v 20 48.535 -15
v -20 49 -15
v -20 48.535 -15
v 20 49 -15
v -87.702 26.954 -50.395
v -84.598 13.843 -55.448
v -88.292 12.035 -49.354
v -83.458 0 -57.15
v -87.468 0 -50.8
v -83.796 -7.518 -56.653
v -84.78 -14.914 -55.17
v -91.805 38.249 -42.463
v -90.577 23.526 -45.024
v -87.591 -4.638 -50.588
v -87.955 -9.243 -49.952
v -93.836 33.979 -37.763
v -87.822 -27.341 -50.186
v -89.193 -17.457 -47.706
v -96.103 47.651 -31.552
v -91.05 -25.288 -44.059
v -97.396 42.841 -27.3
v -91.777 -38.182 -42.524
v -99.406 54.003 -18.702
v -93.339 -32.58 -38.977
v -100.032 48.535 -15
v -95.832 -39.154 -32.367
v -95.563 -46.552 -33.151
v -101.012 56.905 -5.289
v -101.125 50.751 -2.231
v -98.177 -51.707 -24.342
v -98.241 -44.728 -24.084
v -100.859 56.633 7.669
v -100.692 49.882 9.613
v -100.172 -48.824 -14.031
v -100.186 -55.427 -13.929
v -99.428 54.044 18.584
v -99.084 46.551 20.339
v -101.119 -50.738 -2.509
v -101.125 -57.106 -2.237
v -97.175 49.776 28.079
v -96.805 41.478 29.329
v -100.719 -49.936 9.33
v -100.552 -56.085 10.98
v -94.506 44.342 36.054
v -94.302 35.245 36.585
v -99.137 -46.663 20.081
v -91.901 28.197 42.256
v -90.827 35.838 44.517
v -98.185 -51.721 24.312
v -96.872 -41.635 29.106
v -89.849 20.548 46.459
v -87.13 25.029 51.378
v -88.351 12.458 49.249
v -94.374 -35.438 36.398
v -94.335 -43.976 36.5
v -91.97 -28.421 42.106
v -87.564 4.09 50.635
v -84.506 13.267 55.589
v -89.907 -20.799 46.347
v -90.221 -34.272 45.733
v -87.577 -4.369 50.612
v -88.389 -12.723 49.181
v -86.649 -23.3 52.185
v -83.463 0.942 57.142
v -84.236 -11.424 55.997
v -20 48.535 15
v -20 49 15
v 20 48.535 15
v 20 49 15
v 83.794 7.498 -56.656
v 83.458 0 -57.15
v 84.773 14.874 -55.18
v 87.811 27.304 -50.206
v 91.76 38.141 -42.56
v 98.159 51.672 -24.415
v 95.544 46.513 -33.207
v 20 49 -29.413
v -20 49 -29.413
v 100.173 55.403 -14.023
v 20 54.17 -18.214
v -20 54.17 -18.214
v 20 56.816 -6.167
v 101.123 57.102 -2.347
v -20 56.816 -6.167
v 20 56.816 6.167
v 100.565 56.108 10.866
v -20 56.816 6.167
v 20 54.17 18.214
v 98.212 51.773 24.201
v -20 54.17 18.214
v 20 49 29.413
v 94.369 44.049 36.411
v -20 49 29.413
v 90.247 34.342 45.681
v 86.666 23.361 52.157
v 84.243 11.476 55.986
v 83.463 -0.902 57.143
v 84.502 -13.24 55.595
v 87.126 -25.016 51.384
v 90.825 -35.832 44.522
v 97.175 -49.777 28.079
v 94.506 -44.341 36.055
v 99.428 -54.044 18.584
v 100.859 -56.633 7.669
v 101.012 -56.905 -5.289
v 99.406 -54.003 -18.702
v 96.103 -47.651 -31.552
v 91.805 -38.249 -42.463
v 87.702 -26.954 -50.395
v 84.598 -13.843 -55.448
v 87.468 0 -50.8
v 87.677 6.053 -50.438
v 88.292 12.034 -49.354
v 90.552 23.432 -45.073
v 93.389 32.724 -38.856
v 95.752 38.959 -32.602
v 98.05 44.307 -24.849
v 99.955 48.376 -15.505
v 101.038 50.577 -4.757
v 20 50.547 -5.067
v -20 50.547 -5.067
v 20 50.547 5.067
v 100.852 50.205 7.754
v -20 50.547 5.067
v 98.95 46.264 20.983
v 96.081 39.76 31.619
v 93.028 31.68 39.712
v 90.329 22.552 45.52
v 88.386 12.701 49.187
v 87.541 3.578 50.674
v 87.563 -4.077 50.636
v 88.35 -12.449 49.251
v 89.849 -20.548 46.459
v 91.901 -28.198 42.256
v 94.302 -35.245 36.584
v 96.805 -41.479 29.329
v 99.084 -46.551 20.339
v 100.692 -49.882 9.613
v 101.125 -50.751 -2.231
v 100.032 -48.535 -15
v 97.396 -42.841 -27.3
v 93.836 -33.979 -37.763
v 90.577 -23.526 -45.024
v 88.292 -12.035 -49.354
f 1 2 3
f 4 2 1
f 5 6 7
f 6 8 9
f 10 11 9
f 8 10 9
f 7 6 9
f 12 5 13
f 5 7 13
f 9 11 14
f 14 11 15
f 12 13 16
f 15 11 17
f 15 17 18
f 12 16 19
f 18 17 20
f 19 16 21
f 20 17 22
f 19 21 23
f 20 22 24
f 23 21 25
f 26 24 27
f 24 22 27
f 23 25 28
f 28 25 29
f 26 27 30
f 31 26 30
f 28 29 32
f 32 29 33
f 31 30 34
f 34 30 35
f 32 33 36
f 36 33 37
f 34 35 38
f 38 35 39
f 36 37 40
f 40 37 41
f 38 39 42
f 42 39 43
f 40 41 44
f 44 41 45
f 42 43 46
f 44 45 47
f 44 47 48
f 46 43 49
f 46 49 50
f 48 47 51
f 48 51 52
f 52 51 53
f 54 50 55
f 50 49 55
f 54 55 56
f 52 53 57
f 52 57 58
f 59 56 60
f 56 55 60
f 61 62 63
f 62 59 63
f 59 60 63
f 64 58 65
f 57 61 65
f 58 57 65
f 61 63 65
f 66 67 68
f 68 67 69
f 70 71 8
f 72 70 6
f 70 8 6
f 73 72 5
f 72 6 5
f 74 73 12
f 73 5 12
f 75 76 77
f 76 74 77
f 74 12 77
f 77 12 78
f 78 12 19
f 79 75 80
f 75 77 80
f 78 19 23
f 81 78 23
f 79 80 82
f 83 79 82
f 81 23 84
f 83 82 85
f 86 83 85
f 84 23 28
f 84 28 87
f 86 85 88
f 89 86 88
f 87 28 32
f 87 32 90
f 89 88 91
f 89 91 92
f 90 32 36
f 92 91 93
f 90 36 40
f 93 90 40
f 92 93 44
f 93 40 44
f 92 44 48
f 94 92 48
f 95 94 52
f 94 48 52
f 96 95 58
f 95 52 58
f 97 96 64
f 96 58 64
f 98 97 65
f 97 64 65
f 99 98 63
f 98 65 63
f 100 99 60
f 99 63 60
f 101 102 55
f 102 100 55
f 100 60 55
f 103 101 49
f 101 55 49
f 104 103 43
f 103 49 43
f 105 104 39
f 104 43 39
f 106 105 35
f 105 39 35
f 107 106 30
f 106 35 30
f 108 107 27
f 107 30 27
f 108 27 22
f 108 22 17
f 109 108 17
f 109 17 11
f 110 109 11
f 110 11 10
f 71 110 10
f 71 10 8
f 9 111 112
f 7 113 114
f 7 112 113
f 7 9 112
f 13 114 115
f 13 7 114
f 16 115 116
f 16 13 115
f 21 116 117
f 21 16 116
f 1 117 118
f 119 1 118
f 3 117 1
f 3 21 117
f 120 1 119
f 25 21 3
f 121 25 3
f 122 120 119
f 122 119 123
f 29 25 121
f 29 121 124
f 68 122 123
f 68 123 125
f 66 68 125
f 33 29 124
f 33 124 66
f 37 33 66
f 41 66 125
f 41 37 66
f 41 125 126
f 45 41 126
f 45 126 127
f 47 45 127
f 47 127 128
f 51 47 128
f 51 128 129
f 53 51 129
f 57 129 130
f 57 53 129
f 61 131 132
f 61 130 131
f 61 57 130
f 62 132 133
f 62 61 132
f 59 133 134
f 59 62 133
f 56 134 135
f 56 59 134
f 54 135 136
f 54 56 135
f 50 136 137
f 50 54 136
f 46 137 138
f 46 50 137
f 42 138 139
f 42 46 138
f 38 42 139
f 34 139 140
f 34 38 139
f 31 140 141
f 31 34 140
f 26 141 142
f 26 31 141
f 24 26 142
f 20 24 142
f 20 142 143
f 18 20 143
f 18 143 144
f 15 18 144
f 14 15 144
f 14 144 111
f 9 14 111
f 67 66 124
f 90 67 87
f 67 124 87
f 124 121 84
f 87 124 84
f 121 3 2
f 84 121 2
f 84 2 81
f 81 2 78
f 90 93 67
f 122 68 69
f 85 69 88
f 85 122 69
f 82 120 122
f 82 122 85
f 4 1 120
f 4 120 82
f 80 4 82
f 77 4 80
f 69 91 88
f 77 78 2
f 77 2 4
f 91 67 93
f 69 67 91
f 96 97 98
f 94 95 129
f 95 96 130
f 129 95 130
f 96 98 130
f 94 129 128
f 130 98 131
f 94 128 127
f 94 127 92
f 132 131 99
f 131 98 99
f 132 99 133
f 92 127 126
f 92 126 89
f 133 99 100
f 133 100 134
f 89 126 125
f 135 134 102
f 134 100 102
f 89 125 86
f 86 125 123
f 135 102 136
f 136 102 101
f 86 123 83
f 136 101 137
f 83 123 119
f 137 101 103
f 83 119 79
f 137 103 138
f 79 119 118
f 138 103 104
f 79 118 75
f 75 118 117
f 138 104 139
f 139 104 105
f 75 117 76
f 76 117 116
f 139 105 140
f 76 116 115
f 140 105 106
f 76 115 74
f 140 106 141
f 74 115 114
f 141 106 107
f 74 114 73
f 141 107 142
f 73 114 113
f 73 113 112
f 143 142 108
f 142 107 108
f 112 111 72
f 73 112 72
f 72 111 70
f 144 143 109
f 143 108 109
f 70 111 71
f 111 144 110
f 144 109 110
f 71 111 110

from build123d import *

# Parameters (mm, degrees)
BOSS_EXTRUDE1_DEPTH      = 101.15
BOSS_EXTRUDE1_DEPTH_BACK = 101.15
SKETCH1_R                = 57.15
SKETCH1_R_2              = 50.8
CUT_EXTRUDE3_DEPTH       = 130.474196271
CUT_EXTRUDE3_DEPTH_BACK  = 130.474196271
SKETCH3_W                = 40
SKETCH3_H                = 10
SKETCH5_W                = 40
SKETCH5_H                = 30
CUT_EXTRUDE5_DEPTH       = 18.15
CUT_EXTRUDE6_DEPTH       = 130.474196271
CUT_EXTRUDE6_DEPTH_BACK  = 130.474196271
SKETCH6_W                = 252.16572489
SKETCH6_H                = 244.887597008
SKETCH6_R                = 101.15


with BuildPart() as part:
    # Sketch1 → Boss-Extrude1 (new, two sides: drawn at the far end of the back side and taken through both)
    with BuildSketch(Plane(origin=(0, 0, 0), x_dir=(0, 0, -1), z_dir=(1, 0, 0)).offset(-BOSS_EXTRUDE1_DEPTH_BACK)):
        Circle(SKETCH1_R)
        Circle(SKETCH1_R_2, mode=Mode.SUBTRACT)
    extrude(amount=BOSS_EXTRUDE1_DEPTH + BOSS_EXTRUDE1_DEPTH_BACK)

    # Sketch3 → Cut-Extrude3 (cut, two sides: drawn at the far end of the back side and taken through both)
    with BuildSketch(Plane.XY.offset(-CUT_EXTRUDE3_DEPTH_BACK)):
        with Locations((0, 54)):
            Rectangle(SKETCH3_W, SKETCH3_H)
    extrude(amount=CUT_EXTRUDE3_DEPTH + CUT_EXTRUDE3_DEPTH_BACK, mode=Mode.SUBTRACT)

    # Sketch5 → Cut-Extrude5 (cut)
    with BuildSketch(Plane(origin=(0, 49, 0), x_dir=(1, 0, 0), z_dir=(0, 1, 0))):
        Rectangle(SKETCH5_W, SKETCH5_H)
    extrude(amount=-CUT_EXTRUDE5_DEPTH, mode=Mode.SUBTRACT)

    # Sketch6 → Cut-Extrude6 (cut, two sides: drawn at the far end of the back side and taken through both)
    with BuildSketch(Plane(origin=(0, 0, 0), x_dir=(1, 0, 0), z_dir=(0, 1, 0)).offset(-CUT_EXTRUDE6_DEPTH_BACK)):
        Rectangle(SKETCH6_W, SKETCH6_H)
        Circle(SKETCH6_R, mode=Mode.SUBTRACT)
    extrude(amount=CUT_EXTRUDE6_DEPTH + CUT_EXTRUDE6_DEPTH_BACK, mode=Mode.SUBTRACT)


solid = part.part
